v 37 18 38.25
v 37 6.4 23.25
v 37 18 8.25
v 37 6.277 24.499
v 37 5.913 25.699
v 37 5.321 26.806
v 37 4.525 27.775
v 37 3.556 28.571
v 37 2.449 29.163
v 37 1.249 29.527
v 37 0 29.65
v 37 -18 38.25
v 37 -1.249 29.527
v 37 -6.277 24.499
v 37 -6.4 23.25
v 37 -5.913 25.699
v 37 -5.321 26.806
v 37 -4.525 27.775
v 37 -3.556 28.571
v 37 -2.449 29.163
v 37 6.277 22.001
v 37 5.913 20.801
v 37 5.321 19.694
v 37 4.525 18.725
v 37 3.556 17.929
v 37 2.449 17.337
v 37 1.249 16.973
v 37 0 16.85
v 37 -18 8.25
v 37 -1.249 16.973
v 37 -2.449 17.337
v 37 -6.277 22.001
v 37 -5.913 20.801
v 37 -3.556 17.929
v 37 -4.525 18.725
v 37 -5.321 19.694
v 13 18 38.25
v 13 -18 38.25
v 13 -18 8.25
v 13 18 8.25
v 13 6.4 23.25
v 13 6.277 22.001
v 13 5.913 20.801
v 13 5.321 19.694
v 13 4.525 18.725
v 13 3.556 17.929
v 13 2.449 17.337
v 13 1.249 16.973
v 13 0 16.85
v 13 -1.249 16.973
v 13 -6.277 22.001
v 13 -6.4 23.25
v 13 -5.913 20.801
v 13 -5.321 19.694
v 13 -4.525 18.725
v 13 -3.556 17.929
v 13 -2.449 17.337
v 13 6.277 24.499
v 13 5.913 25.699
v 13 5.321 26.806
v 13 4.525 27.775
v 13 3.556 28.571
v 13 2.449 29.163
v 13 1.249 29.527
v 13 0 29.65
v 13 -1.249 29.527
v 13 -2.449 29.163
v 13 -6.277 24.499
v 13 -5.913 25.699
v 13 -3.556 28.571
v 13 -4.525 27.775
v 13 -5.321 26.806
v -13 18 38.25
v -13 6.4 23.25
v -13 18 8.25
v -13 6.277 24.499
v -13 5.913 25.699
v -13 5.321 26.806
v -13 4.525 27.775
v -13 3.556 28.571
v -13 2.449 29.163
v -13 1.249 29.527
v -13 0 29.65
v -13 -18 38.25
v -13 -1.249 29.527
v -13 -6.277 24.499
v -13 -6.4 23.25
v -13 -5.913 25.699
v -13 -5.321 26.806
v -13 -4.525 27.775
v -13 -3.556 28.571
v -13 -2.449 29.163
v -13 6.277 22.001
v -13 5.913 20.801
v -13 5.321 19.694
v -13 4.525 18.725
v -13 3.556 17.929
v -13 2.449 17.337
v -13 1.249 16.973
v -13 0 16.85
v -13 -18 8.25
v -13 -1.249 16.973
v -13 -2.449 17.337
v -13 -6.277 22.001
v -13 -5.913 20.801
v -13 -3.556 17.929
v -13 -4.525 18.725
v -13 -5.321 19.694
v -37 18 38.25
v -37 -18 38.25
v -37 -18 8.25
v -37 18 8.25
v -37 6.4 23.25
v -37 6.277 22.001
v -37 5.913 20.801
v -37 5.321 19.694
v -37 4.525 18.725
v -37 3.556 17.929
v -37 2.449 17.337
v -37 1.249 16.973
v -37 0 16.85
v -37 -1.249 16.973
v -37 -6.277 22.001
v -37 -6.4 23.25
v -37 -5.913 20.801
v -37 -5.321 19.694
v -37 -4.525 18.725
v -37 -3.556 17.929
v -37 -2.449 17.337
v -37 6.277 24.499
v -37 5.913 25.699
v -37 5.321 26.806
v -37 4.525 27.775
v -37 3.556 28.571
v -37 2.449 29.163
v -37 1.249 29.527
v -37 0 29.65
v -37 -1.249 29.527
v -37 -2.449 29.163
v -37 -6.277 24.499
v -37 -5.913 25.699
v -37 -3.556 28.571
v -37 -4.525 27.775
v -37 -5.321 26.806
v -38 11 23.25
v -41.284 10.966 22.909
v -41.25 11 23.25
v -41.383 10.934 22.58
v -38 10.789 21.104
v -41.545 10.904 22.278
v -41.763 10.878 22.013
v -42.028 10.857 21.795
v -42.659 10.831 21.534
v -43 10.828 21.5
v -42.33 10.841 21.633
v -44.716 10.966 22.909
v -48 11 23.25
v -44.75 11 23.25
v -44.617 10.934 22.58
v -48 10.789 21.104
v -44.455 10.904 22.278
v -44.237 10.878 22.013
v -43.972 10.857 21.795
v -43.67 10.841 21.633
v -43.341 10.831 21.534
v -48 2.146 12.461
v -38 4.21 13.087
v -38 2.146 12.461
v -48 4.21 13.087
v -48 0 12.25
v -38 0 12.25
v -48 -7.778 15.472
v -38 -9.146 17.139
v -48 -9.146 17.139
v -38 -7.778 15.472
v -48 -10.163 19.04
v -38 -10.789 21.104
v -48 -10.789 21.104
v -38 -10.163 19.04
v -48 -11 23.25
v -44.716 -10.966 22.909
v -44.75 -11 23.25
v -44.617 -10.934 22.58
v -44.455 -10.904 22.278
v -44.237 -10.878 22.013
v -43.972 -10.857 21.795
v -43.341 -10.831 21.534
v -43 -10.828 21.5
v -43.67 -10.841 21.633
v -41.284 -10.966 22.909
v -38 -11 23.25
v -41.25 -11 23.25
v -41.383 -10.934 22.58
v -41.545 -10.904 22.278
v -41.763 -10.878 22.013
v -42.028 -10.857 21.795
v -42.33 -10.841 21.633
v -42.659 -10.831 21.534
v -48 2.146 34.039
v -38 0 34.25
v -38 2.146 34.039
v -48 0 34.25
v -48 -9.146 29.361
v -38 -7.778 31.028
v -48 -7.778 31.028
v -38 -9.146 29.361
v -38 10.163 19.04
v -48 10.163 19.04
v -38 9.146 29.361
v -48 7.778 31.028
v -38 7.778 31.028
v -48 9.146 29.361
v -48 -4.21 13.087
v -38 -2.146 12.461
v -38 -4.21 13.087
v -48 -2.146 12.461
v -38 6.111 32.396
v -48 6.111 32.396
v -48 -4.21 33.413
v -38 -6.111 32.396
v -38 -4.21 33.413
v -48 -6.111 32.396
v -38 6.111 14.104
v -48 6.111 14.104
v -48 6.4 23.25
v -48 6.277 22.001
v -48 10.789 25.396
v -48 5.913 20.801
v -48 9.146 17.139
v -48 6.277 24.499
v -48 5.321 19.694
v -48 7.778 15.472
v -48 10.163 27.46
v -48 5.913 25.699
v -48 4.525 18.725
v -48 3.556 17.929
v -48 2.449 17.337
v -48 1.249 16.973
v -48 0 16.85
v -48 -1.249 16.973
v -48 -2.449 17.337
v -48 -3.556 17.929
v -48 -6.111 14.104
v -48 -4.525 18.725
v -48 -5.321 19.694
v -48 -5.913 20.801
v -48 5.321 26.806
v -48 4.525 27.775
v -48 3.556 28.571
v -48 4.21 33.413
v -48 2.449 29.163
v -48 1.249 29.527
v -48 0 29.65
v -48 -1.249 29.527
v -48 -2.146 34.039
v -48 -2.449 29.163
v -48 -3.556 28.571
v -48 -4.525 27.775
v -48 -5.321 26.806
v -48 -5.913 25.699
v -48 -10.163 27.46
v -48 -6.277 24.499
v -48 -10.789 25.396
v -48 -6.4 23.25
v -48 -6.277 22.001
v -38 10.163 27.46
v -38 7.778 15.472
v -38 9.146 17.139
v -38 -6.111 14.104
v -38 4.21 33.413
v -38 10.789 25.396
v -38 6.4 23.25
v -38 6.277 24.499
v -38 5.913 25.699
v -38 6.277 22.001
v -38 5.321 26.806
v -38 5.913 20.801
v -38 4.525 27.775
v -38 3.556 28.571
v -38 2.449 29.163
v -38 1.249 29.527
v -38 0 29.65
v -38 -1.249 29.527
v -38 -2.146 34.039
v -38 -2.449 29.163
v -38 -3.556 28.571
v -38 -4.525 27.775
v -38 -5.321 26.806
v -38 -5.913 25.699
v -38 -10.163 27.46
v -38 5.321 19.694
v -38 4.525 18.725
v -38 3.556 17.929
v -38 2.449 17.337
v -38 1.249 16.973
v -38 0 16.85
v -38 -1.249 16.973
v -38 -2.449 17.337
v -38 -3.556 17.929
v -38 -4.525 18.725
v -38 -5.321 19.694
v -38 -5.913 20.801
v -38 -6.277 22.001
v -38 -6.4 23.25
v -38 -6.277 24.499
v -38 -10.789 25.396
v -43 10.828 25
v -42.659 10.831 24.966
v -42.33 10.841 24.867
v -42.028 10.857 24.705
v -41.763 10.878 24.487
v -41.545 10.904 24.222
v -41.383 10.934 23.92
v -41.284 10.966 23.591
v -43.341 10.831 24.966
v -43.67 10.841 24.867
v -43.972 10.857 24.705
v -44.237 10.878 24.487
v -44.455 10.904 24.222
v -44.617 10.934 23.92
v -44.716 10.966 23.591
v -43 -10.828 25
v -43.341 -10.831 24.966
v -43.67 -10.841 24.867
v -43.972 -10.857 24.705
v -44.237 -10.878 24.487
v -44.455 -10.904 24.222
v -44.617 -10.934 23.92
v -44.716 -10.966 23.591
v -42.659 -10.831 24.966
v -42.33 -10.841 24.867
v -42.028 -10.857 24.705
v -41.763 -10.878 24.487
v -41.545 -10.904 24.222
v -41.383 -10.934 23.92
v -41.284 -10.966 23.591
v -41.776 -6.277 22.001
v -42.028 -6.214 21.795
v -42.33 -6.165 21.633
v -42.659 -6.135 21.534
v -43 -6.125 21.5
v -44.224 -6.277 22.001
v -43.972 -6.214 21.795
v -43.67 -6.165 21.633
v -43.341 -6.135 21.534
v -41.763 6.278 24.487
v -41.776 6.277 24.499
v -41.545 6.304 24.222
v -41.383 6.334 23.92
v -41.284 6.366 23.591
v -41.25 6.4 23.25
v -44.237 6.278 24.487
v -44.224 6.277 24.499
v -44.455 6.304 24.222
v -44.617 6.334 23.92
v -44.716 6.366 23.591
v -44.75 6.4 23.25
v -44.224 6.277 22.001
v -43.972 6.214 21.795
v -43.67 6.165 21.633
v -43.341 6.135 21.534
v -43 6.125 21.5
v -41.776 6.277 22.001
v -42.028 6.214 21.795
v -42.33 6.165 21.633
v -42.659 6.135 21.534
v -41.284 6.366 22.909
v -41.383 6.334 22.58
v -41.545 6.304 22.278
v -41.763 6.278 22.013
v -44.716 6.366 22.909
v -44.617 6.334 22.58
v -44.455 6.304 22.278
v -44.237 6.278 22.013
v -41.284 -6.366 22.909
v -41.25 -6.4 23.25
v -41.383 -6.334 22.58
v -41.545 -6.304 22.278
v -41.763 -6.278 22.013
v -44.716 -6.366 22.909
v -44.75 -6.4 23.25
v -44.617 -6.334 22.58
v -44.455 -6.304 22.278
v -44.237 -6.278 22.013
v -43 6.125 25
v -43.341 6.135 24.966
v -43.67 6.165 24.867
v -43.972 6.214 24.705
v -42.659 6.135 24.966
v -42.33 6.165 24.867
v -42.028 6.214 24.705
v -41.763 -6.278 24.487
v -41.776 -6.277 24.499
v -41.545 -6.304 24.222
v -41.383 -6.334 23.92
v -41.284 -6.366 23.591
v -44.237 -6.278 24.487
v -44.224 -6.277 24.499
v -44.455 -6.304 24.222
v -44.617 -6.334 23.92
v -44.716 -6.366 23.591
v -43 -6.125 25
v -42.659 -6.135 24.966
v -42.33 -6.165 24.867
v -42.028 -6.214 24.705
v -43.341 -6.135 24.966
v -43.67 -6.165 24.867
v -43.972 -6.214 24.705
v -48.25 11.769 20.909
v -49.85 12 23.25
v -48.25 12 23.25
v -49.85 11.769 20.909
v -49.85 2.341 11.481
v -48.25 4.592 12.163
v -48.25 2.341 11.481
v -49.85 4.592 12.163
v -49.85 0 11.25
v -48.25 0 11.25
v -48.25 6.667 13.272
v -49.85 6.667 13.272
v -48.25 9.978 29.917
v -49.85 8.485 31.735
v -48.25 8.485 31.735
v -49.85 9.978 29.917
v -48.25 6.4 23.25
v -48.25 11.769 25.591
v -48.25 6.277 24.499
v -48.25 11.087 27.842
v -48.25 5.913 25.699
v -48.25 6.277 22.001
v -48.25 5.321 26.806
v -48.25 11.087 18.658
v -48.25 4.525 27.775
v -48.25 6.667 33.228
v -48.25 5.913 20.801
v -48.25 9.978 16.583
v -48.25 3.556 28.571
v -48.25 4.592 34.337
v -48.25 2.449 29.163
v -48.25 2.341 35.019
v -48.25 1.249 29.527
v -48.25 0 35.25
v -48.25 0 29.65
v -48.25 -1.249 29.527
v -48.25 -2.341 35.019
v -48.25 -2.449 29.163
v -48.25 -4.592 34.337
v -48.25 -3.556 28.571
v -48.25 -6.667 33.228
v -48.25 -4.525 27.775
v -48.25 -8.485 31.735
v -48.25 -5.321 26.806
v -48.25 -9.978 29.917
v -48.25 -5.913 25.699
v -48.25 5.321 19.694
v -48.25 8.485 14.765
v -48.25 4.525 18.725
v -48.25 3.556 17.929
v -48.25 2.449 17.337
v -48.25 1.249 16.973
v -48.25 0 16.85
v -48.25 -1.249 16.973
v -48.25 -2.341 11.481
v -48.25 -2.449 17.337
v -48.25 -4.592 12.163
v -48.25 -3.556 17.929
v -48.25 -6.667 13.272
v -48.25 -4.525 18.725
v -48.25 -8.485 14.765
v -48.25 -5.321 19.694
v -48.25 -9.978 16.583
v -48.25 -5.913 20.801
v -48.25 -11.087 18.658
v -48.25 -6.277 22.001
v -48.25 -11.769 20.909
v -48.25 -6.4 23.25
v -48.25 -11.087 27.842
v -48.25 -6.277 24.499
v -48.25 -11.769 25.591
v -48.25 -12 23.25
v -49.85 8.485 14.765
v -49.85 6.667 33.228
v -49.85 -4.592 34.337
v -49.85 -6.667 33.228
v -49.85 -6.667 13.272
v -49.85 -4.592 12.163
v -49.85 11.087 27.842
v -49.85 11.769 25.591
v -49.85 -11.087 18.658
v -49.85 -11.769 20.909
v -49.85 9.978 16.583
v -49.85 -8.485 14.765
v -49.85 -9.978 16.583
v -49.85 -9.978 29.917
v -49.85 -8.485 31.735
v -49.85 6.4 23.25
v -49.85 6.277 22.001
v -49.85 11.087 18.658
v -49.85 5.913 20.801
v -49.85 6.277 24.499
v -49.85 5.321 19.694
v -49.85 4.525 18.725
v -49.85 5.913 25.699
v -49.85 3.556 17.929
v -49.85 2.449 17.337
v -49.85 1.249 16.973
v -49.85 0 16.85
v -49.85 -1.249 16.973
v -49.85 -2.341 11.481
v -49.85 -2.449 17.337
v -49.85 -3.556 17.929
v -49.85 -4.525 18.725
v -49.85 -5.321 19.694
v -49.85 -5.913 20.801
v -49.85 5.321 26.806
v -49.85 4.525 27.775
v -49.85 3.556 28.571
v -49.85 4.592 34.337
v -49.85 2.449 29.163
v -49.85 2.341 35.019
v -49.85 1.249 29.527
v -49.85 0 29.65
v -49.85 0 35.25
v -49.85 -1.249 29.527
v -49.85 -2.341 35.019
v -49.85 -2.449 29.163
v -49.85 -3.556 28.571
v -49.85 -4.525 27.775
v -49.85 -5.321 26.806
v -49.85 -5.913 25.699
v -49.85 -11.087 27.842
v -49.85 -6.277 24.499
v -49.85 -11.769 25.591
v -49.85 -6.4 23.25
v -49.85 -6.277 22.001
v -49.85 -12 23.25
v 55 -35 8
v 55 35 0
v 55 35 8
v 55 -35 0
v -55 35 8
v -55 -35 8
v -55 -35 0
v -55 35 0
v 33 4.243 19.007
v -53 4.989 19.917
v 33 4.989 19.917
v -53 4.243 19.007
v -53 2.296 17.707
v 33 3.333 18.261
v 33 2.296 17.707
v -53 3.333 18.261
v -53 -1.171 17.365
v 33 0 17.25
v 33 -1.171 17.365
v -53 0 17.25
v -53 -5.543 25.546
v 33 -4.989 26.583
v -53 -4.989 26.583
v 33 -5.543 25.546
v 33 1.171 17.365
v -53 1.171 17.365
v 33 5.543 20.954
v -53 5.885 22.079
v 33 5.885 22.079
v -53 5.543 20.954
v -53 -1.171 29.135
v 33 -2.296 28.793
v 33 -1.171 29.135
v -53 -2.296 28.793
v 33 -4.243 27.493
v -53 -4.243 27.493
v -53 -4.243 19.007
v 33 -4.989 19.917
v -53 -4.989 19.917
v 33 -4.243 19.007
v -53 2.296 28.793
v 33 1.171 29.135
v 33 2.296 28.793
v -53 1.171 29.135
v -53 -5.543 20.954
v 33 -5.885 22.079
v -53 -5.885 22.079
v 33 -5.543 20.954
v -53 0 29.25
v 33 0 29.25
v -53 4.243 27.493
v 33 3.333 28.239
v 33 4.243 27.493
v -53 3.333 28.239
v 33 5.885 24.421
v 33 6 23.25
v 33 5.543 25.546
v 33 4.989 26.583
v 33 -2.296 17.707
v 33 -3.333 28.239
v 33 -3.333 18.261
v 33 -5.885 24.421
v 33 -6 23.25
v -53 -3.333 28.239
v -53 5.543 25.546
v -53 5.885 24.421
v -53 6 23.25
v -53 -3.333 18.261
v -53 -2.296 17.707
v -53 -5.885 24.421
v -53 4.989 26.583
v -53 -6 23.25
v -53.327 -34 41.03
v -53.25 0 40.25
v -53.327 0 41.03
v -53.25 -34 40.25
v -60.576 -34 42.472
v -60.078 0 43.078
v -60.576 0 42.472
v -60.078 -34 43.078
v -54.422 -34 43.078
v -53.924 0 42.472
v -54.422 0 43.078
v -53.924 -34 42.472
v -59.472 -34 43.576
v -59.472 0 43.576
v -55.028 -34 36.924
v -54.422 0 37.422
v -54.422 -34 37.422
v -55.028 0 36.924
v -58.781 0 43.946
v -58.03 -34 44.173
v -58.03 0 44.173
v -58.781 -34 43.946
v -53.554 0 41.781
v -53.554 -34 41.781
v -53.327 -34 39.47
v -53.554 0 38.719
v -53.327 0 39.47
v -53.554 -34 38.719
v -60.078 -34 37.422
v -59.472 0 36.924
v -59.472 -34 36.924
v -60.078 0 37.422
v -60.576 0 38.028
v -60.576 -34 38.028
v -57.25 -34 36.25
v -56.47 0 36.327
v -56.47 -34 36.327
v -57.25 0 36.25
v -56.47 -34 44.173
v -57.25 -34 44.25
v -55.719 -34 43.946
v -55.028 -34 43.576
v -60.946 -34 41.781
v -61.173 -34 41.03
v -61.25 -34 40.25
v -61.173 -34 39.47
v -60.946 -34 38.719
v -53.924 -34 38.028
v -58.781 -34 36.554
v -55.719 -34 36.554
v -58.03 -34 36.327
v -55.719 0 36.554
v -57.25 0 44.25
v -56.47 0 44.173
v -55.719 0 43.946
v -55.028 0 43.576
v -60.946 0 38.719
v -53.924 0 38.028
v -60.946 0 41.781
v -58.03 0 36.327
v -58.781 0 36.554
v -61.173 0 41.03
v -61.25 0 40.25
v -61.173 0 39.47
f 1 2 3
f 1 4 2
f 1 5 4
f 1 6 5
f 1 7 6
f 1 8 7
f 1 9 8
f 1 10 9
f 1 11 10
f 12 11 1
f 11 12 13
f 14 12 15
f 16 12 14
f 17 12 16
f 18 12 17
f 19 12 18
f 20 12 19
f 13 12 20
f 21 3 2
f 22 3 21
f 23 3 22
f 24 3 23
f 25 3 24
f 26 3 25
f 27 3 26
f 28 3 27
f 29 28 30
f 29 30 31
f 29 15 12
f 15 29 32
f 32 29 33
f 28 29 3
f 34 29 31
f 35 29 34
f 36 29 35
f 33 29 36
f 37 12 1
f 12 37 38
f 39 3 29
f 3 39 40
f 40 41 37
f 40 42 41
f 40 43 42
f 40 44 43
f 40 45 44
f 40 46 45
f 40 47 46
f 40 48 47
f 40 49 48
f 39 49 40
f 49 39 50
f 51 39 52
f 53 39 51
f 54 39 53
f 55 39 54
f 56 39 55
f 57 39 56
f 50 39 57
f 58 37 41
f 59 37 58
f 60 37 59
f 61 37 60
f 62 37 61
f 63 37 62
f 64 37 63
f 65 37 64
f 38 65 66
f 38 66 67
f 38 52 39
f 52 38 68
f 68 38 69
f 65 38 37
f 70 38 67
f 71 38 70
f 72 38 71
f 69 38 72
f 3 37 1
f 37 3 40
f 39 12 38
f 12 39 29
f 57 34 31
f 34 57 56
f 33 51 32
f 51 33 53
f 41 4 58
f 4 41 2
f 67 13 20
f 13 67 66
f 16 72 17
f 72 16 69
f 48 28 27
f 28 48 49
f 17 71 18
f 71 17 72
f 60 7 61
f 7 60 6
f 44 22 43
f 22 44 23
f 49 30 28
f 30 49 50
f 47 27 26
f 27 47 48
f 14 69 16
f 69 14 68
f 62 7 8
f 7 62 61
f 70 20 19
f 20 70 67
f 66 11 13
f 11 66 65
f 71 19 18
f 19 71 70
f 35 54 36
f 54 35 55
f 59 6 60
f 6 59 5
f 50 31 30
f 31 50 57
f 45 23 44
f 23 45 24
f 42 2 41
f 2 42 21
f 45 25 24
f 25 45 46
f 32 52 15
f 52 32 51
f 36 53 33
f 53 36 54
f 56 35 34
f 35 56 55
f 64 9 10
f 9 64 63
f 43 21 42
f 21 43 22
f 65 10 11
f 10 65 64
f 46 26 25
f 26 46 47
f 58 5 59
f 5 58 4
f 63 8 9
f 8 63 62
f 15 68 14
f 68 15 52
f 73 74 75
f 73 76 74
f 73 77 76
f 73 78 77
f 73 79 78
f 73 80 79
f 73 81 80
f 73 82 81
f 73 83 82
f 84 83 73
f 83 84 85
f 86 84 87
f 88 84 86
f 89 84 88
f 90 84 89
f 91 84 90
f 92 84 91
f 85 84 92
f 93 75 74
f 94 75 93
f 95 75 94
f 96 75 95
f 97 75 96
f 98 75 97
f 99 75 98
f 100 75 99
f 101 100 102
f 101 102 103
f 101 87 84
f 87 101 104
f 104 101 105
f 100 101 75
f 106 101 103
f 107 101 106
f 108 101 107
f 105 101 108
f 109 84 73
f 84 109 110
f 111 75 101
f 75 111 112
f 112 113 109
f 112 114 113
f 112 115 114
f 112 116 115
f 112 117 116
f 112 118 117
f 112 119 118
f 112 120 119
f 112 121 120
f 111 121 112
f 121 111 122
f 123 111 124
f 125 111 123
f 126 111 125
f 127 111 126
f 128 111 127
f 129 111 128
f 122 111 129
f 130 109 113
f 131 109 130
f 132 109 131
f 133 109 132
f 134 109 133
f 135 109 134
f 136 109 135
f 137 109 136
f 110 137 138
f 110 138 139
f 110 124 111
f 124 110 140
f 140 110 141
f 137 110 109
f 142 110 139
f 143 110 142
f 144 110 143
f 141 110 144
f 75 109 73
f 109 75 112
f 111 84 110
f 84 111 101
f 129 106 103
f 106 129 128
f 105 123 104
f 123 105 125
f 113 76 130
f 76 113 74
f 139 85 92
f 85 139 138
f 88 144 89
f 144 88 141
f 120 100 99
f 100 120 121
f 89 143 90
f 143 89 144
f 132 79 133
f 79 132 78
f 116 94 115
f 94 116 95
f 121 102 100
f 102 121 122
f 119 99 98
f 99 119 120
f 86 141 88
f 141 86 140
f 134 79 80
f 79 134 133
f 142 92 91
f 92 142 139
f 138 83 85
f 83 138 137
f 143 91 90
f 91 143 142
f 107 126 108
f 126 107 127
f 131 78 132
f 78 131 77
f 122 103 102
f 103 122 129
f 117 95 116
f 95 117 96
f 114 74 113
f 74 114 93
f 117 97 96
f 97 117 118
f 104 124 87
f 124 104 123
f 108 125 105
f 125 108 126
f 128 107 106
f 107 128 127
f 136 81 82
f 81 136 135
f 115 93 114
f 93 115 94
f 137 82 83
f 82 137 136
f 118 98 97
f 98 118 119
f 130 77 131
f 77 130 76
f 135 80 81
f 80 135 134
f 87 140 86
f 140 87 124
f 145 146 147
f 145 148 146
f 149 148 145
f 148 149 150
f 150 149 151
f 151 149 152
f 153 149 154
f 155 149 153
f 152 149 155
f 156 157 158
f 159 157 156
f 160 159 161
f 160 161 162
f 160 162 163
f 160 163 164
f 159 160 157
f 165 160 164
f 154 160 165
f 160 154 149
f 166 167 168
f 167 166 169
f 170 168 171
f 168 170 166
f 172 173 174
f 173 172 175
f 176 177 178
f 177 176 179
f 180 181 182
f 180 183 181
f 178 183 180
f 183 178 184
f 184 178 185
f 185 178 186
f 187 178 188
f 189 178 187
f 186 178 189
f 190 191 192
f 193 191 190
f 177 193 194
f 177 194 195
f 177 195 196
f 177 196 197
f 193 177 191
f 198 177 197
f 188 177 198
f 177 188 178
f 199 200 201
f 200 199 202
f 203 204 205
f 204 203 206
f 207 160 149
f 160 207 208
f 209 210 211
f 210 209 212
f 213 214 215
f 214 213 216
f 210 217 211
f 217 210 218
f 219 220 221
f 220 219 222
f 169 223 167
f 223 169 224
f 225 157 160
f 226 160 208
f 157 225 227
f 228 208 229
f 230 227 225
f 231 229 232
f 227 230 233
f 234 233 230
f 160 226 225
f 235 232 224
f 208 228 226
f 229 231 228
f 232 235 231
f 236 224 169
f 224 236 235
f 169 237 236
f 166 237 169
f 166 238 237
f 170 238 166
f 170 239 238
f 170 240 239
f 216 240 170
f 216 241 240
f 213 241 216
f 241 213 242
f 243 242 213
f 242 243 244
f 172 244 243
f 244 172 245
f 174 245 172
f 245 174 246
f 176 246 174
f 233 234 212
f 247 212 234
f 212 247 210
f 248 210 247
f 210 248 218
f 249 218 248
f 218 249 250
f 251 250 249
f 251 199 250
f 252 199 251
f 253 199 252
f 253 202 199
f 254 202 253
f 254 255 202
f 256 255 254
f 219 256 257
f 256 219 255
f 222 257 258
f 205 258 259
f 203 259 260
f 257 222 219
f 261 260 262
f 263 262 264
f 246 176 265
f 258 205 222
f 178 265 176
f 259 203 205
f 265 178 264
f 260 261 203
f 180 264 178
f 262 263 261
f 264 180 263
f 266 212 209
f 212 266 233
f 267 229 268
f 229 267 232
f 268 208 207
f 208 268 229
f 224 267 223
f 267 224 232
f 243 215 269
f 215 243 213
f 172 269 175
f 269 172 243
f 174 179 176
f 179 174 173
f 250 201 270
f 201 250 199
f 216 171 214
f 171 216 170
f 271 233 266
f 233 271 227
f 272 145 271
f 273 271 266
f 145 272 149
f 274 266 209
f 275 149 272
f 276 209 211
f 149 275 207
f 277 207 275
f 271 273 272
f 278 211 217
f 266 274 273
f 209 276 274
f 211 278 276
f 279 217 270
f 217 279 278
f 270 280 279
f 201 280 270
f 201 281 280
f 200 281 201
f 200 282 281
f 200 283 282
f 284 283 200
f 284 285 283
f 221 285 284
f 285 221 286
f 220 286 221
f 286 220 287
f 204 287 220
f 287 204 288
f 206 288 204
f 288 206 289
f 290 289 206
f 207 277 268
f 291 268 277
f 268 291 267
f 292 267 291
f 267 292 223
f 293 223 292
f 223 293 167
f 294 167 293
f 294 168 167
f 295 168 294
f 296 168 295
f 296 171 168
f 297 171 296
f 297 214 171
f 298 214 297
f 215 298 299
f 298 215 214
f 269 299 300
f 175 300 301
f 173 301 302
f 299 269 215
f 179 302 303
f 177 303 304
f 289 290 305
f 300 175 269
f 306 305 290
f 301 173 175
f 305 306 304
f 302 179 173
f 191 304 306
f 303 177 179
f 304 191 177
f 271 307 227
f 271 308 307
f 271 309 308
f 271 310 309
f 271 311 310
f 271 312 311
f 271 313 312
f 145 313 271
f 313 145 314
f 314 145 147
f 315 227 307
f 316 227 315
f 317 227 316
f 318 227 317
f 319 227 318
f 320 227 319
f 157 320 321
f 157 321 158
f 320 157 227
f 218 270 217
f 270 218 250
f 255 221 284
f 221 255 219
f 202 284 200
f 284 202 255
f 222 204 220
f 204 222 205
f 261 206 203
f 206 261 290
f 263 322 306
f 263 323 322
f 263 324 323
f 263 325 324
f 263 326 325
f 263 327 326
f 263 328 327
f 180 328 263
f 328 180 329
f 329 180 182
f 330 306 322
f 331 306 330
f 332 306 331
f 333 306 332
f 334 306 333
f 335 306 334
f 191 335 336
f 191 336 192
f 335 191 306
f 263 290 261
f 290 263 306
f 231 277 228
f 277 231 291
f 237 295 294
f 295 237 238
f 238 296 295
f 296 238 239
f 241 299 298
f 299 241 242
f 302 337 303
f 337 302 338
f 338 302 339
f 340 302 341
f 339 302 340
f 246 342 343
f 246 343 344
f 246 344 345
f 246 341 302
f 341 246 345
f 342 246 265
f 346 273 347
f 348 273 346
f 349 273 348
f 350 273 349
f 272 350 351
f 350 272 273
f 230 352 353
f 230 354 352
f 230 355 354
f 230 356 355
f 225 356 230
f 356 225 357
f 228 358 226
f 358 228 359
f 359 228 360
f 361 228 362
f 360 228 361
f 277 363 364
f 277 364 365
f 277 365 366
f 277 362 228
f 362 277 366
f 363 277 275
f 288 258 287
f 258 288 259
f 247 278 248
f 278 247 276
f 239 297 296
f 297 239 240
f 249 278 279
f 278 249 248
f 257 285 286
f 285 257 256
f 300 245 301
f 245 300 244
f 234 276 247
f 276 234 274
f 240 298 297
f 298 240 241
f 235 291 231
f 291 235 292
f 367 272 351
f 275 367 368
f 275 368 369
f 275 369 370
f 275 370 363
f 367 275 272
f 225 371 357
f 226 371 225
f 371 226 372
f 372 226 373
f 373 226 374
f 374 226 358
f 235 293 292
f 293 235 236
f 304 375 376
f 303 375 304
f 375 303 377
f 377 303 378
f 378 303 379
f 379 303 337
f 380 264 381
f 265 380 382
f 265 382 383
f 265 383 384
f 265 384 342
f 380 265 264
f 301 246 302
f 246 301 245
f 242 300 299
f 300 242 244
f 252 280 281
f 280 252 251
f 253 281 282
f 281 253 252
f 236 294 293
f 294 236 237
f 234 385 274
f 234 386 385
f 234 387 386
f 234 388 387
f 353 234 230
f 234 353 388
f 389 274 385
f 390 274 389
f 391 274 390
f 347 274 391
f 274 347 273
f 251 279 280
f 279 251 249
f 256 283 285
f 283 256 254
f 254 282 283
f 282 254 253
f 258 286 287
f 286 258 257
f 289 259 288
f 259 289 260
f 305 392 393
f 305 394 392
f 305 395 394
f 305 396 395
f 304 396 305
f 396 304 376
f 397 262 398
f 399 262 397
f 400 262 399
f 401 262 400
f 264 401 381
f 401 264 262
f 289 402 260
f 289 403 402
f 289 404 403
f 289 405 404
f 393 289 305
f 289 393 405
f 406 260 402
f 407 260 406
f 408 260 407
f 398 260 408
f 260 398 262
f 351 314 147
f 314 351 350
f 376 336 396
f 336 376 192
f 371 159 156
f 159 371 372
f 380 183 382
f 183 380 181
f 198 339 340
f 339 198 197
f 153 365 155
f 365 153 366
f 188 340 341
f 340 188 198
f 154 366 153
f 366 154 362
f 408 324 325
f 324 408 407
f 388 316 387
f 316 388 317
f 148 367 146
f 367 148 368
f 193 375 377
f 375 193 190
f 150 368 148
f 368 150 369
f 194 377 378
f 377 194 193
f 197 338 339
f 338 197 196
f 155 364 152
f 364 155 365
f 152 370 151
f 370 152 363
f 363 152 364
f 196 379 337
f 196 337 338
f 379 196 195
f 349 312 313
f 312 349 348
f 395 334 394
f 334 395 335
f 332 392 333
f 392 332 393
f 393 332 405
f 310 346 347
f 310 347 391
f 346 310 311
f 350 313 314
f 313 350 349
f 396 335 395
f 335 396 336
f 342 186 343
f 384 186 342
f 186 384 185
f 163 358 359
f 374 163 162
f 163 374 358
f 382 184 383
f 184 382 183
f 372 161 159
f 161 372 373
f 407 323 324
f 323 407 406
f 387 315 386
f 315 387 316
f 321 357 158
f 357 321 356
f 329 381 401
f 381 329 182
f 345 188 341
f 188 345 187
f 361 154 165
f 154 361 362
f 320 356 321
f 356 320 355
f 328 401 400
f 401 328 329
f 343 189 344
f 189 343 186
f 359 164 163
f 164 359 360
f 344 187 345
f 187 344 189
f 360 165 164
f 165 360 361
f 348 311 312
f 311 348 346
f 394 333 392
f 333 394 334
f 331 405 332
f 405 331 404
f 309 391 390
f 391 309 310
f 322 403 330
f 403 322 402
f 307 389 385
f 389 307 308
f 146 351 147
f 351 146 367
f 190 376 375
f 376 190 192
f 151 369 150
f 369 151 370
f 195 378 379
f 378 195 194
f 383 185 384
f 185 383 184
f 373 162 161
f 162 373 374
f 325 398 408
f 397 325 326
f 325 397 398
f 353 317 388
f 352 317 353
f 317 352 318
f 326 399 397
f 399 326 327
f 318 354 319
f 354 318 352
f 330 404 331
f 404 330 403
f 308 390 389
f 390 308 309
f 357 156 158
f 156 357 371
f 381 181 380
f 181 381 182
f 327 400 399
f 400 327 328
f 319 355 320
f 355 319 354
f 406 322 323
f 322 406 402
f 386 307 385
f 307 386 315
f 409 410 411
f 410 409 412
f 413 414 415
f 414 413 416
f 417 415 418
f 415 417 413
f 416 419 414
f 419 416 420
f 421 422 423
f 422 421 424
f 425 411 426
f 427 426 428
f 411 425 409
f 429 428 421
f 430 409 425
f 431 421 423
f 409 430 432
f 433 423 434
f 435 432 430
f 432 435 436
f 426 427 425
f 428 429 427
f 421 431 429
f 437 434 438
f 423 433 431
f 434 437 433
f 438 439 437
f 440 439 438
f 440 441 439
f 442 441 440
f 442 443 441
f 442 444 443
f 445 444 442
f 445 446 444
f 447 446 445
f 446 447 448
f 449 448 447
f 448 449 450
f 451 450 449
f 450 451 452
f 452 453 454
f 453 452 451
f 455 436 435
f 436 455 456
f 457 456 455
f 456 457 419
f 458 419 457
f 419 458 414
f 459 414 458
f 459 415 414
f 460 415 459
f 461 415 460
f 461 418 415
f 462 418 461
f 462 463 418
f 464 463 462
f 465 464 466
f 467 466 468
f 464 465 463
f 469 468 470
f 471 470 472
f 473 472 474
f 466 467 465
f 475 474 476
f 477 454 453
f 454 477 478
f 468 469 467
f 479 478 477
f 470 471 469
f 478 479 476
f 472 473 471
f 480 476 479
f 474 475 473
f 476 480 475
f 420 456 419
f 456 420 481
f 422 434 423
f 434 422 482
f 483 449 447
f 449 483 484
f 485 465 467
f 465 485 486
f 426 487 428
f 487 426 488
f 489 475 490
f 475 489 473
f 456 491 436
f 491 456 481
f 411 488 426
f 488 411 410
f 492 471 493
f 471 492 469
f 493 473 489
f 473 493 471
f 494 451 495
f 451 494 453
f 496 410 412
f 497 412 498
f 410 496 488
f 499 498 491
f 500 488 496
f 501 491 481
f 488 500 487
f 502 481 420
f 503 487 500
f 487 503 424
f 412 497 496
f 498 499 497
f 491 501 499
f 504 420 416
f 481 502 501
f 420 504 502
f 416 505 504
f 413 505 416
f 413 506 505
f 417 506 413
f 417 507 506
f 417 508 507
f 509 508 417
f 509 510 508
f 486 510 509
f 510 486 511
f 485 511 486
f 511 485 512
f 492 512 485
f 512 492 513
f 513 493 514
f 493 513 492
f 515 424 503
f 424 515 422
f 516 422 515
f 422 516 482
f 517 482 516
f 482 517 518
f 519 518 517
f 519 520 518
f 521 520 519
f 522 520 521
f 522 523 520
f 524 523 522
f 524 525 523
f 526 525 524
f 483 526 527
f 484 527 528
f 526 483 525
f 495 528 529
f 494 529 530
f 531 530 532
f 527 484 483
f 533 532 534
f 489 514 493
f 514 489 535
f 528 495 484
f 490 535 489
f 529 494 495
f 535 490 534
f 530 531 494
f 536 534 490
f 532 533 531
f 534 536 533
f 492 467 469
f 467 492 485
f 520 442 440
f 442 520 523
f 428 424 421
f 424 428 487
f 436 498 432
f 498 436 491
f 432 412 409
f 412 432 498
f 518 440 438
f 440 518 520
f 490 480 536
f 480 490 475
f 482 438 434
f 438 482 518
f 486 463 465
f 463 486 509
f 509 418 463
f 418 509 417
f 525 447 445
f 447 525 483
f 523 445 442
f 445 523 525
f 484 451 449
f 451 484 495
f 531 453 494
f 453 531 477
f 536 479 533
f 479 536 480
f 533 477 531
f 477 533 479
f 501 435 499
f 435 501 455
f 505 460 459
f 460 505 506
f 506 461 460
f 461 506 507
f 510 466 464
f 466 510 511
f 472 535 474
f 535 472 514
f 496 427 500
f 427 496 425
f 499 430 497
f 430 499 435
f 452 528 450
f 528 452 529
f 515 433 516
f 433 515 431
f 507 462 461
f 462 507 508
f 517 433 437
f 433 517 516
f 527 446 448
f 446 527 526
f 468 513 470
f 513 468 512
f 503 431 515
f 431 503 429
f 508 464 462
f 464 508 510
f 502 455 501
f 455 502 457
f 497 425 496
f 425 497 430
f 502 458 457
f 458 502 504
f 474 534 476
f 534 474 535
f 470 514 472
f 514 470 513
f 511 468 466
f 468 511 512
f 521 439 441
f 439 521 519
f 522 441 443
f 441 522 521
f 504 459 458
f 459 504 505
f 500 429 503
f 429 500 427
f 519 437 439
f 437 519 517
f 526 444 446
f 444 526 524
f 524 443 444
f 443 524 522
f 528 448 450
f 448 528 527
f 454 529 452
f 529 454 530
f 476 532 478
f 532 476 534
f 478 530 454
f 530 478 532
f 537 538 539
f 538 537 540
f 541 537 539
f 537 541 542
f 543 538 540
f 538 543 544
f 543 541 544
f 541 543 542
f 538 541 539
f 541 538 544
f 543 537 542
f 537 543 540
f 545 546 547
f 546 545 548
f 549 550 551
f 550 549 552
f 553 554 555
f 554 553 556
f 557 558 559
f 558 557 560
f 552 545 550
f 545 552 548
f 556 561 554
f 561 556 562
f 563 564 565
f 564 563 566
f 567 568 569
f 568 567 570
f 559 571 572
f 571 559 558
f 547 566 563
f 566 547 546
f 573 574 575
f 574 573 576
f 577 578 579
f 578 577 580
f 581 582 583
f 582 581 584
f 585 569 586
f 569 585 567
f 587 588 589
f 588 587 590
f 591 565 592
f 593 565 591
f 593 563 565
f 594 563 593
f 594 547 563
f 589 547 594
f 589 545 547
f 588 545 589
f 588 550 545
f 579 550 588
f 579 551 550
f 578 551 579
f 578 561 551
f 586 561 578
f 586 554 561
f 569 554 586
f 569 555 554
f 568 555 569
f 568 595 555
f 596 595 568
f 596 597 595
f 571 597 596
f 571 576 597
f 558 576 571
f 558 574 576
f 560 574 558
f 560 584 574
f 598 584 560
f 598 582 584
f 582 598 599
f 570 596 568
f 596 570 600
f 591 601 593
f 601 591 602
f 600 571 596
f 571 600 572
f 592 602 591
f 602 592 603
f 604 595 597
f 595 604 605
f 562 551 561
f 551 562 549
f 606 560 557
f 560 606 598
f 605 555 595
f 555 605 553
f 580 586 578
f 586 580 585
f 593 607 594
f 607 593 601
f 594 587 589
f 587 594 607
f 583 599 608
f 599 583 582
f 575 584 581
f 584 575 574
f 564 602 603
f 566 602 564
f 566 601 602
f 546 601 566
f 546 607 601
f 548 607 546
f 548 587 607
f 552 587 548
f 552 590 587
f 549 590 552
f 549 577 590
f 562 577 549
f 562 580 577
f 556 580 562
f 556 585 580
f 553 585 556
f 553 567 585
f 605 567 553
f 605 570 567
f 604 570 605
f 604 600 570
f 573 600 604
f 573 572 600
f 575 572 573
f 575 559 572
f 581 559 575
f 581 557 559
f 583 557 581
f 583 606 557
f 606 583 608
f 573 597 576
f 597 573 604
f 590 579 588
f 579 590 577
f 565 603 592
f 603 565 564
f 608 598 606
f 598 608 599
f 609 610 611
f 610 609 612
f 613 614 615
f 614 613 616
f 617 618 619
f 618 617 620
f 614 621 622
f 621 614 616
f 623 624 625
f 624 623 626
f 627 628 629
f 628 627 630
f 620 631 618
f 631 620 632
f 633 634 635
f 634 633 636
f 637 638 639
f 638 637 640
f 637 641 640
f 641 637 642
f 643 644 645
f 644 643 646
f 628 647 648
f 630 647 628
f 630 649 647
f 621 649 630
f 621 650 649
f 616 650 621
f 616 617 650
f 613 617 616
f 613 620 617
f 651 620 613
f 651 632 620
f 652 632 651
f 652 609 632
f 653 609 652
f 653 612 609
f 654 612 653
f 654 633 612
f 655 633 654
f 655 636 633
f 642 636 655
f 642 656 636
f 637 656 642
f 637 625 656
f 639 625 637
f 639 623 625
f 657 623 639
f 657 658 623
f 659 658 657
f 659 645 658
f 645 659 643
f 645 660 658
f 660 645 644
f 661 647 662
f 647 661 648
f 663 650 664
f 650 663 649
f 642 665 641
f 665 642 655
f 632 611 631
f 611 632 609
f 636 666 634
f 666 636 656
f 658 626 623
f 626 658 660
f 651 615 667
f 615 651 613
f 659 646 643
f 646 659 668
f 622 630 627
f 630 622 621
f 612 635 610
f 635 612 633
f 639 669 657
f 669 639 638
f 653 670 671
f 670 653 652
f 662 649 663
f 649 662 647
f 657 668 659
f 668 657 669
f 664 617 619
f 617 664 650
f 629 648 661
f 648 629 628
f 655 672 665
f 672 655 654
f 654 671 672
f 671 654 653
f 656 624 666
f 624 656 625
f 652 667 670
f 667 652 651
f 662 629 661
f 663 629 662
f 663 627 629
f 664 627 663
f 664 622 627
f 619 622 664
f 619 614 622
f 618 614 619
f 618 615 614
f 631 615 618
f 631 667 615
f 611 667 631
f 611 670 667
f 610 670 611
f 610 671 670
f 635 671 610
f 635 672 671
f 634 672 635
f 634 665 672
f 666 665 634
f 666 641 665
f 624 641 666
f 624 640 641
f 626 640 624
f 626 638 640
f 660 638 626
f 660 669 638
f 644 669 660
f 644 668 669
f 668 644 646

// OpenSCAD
$fn = 32;

// ------------------------------------------------------------------------
// Machine vise: screw d12, jaws 24 x 30 mm
// Every part is its own module, assembly() places every instance.
// ------------------------------------------------------------------------

// --- part 1 ---
module vise_bed() {
  difference() {
    translate([-55, -35, 0]) cube([110, 70, 8]);
  }
}

// --- part 2 ---
module vise_jaw() {
  difference() {
    translate([-12, -18, 0]) cube([24, 36, 30]);
    translate([0, 0, 15]) rotate([0, 90, 0]) cylinder(h = 26, d = 12.8, center = true);
  }
}

// --- part 3 ---
module vise_screw() {
  translate([0, 0, -43]) cylinder(h = 86, d = 12);
}

// --- part 4 ---
module screw_collar() {
  difference() {
    cylinder(h = 10, d = 22);
    translate([0, 0, -1]) cylinder(h = 12, d = 12.8);
    translate([0, 0, 5]) rotate([90, 0, 0]) cylinder(h = 24, d = 3.5, center = true);
  }
}

// --- part 5 ---
module screw_washer() {
  difference() {
      translate([0, 0, 0]) cylinder(h = 1.6, d = 24);
      translate([0, 0, -1]) cylinder(h = 3.6, d = 12.8);
    }
}

// --- part 6 ---
module vise_handle() {
  cylinder(h = 34, d = 8);
}

// --- assembly ---
module assembly() {
  color([0.80, 0.24, 0.20]) translate([0, 0, 0]) rotate([0, 0, 0]) vise_bed();
  color([0.20, 0.45, 0.75]) translate([25, 0, 8.25]) rotate([0, 0, 0]) vise_jaw();
  color([0.25, 0.62, 0.32]) translate([-25, 0, 8.25]) rotate([0, 0, 0]) vise_jaw();
  color([0.92, 0.70, 0.18]) translate([-10, 0, 23.25]) rotate([0, 90, 0]) vise_screw();
  color([0.58, 0.35, 0.70]) translate([-48, 0, 23.25]) rotate([0, 90, 0]) screw_collar();
  color([0.16, 0.66, 0.66]) translate([-49.85, 0, 23.25]) rotate([0, 90, 0]) screw_washer();
  color([0.85, 0.48, 0.18]) translate([-57.25, 0, 40.25]) rotate([90, 0, 0]) vise_handle();
}

assembly();
